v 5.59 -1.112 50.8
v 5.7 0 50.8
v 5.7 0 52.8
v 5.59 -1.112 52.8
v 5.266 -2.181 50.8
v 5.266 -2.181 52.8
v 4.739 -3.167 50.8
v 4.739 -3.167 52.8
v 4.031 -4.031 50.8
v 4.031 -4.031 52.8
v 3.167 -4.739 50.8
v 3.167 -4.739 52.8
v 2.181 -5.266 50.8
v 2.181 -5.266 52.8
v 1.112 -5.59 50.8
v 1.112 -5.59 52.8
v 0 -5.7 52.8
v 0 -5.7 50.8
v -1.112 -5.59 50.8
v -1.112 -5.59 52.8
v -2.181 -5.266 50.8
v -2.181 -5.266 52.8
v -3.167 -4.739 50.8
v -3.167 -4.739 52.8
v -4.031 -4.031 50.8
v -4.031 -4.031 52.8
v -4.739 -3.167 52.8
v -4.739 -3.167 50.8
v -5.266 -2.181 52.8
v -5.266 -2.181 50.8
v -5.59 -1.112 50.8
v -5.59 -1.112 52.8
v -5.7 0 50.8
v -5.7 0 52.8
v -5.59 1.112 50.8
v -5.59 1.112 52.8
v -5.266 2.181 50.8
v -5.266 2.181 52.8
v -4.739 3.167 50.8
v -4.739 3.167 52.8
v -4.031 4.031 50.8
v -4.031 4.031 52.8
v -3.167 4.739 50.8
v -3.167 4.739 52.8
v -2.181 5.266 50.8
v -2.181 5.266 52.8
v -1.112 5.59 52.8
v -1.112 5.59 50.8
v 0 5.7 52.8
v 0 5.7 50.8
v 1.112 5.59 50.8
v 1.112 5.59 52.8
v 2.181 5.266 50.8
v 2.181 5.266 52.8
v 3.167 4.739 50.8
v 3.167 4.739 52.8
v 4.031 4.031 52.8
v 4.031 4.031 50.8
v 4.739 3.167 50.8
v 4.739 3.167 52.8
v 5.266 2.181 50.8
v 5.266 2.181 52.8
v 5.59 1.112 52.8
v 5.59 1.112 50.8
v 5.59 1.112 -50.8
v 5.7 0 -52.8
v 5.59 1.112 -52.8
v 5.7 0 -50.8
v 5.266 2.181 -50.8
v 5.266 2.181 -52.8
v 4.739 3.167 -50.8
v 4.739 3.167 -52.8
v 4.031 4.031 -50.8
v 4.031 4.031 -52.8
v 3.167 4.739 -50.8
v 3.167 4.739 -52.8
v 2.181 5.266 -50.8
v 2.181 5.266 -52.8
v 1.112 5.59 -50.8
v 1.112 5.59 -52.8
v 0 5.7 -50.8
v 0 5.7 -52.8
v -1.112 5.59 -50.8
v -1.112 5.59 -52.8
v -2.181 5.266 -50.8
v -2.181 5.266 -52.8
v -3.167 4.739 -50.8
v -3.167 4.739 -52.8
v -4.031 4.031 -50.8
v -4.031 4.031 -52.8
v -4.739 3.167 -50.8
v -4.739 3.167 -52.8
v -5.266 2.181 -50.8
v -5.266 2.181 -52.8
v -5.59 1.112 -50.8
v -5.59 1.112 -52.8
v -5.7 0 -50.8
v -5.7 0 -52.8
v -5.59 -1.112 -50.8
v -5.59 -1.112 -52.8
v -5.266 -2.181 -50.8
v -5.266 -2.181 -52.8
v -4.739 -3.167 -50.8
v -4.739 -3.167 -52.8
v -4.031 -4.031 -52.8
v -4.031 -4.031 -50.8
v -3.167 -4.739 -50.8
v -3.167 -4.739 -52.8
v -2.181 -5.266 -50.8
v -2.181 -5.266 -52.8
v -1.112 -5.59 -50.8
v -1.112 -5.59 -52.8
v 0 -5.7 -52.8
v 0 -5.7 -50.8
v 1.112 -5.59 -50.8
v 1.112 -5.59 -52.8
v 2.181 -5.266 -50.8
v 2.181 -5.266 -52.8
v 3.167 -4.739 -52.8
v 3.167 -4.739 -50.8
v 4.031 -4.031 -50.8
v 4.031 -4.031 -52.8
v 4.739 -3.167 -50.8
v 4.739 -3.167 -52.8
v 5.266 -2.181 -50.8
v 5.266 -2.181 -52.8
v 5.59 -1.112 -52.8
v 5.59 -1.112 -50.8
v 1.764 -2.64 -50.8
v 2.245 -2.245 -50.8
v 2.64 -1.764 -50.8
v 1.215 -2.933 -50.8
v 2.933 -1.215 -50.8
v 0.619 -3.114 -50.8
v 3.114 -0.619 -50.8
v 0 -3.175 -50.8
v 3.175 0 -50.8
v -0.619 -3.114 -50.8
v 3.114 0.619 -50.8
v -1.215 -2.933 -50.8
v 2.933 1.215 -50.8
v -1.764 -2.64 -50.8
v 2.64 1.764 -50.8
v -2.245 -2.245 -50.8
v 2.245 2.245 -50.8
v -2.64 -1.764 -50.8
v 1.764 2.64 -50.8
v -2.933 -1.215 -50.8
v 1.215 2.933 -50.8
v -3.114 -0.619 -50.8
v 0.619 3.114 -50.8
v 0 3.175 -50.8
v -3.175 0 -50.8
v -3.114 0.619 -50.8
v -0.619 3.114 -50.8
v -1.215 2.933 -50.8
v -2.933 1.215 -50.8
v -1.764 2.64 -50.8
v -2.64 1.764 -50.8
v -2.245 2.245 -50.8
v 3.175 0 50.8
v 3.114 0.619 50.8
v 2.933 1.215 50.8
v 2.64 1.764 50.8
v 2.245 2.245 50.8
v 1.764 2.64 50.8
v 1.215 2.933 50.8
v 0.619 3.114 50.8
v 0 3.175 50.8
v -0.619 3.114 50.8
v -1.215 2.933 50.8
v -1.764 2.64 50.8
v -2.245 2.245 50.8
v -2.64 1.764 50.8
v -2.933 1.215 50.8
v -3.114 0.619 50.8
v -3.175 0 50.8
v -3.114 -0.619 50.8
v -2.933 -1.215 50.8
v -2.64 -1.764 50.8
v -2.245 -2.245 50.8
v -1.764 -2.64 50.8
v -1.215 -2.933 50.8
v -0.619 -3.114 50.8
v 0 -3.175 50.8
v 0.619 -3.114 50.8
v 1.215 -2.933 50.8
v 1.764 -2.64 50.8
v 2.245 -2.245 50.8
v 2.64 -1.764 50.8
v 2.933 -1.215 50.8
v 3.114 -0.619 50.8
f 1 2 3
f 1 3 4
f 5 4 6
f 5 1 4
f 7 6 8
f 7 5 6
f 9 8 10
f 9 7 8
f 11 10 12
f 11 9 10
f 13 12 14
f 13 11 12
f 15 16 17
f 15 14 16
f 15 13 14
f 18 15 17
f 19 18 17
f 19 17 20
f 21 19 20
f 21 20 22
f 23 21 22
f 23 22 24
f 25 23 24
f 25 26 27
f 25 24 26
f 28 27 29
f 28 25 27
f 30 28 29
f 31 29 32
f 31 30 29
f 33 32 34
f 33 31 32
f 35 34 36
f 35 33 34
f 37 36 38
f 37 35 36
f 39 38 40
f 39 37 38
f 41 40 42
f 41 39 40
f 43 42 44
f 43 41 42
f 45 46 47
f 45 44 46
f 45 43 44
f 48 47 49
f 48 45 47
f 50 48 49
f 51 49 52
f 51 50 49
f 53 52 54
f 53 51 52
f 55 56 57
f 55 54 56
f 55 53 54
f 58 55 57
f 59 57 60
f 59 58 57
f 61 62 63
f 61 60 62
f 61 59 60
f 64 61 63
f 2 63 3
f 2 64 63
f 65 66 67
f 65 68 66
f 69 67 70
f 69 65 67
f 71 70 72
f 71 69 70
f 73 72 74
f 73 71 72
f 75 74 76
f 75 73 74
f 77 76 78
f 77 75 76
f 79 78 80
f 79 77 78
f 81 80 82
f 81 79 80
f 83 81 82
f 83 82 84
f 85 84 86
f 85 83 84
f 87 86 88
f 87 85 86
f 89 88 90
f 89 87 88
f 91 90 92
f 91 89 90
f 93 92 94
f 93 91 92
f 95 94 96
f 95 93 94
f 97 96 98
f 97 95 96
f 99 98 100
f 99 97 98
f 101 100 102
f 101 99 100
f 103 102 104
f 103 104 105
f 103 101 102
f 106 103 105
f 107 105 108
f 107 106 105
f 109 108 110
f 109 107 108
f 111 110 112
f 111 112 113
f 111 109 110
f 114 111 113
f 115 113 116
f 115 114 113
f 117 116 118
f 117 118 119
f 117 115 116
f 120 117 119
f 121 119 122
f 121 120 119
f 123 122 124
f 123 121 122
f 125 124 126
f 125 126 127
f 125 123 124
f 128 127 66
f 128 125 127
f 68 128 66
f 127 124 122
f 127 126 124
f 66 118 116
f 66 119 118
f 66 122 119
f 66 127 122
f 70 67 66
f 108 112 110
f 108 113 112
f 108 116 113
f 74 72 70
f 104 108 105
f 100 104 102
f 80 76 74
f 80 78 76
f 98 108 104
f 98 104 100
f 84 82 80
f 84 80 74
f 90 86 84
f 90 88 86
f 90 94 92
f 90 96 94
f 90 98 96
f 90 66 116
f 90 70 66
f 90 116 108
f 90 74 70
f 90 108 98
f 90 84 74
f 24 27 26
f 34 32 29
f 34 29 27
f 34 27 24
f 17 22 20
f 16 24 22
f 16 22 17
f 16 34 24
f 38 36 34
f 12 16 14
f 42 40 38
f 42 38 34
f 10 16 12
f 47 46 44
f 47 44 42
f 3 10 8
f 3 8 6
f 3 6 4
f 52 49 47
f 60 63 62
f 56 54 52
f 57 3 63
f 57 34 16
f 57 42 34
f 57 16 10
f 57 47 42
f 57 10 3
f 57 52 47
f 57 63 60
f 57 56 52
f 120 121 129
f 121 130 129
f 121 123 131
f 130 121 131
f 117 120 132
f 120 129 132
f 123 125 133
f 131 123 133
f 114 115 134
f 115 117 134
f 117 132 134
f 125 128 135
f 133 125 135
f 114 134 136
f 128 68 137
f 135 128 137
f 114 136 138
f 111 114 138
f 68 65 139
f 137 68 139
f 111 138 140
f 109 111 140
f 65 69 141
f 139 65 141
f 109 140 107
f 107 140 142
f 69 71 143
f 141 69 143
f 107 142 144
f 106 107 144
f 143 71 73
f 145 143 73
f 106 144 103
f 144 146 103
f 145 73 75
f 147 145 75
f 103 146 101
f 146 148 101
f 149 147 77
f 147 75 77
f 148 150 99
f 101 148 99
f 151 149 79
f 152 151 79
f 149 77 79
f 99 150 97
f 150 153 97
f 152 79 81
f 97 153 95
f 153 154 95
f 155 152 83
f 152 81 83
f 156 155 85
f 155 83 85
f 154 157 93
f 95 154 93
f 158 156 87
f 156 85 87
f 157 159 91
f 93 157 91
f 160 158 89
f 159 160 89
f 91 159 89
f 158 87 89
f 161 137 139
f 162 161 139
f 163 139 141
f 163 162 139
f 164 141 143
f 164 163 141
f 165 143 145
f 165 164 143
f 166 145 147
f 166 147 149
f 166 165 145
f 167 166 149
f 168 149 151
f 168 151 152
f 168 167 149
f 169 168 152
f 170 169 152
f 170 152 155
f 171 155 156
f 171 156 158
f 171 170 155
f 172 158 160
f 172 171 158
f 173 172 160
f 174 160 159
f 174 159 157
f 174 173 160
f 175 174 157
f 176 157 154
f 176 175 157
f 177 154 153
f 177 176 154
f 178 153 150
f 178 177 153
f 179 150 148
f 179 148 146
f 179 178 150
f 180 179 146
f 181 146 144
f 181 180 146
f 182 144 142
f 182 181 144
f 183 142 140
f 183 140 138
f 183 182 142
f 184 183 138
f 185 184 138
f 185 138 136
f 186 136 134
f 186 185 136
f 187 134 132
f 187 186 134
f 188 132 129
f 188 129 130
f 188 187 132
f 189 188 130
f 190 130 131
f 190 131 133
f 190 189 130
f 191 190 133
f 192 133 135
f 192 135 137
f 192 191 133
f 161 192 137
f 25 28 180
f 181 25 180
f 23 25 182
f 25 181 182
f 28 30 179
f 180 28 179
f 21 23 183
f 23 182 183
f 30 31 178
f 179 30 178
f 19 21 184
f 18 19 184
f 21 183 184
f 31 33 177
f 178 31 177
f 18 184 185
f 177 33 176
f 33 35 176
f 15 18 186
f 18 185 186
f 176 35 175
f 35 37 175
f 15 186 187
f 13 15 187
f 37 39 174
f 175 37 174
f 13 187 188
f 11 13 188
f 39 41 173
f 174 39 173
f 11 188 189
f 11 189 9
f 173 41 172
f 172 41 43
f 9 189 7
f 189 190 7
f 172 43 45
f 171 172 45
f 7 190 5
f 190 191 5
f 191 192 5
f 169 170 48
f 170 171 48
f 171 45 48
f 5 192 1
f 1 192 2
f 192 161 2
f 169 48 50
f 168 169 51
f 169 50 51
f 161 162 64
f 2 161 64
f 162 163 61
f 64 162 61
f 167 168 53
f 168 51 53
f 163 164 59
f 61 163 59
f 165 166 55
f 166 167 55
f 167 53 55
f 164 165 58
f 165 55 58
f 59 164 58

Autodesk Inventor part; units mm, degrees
ref_plane "YZ Plane" through (0, 0, 0) normal (1, 0, 0) x (0, 1, 0)
ref_plane "XZ Plane" through (0, 0, 0) normal (0, 1, 0) x (-1, 0, 0)
ref_plane "XY Plane" through (0, 0, 0) normal (0, 0, 1) x (1, 0, 0)
sketch "Sketch1" plane through (0, 0, 0) normal (0, 0, 1) x (1, 0, 0)
  circle A0 centre (0, 0) radius 3.175
  dimension "d0" = 6.35
extrude "Extrusion1" add sketch "Sketch1" along normal mid plane 101.6
sketch "Sketch2" plane through (0, 0, 50.8) normal (0, 0, 1) x (1, 0, 0)
  circle A0 centre (0, 0) radius 3.175 construction
  circle A1 centre (0, 0) radius 5.7
  dimension "d3" = 11.4
extrude "Extrusion2" add sketch "Sketch2" along normal blind 2
mirror "Mirror1" about plane through (0, 0, 0) normal (0, 0, 1) of "Extrusion2"
properties part number "HINGE PIN" material "Stainless Steel"
